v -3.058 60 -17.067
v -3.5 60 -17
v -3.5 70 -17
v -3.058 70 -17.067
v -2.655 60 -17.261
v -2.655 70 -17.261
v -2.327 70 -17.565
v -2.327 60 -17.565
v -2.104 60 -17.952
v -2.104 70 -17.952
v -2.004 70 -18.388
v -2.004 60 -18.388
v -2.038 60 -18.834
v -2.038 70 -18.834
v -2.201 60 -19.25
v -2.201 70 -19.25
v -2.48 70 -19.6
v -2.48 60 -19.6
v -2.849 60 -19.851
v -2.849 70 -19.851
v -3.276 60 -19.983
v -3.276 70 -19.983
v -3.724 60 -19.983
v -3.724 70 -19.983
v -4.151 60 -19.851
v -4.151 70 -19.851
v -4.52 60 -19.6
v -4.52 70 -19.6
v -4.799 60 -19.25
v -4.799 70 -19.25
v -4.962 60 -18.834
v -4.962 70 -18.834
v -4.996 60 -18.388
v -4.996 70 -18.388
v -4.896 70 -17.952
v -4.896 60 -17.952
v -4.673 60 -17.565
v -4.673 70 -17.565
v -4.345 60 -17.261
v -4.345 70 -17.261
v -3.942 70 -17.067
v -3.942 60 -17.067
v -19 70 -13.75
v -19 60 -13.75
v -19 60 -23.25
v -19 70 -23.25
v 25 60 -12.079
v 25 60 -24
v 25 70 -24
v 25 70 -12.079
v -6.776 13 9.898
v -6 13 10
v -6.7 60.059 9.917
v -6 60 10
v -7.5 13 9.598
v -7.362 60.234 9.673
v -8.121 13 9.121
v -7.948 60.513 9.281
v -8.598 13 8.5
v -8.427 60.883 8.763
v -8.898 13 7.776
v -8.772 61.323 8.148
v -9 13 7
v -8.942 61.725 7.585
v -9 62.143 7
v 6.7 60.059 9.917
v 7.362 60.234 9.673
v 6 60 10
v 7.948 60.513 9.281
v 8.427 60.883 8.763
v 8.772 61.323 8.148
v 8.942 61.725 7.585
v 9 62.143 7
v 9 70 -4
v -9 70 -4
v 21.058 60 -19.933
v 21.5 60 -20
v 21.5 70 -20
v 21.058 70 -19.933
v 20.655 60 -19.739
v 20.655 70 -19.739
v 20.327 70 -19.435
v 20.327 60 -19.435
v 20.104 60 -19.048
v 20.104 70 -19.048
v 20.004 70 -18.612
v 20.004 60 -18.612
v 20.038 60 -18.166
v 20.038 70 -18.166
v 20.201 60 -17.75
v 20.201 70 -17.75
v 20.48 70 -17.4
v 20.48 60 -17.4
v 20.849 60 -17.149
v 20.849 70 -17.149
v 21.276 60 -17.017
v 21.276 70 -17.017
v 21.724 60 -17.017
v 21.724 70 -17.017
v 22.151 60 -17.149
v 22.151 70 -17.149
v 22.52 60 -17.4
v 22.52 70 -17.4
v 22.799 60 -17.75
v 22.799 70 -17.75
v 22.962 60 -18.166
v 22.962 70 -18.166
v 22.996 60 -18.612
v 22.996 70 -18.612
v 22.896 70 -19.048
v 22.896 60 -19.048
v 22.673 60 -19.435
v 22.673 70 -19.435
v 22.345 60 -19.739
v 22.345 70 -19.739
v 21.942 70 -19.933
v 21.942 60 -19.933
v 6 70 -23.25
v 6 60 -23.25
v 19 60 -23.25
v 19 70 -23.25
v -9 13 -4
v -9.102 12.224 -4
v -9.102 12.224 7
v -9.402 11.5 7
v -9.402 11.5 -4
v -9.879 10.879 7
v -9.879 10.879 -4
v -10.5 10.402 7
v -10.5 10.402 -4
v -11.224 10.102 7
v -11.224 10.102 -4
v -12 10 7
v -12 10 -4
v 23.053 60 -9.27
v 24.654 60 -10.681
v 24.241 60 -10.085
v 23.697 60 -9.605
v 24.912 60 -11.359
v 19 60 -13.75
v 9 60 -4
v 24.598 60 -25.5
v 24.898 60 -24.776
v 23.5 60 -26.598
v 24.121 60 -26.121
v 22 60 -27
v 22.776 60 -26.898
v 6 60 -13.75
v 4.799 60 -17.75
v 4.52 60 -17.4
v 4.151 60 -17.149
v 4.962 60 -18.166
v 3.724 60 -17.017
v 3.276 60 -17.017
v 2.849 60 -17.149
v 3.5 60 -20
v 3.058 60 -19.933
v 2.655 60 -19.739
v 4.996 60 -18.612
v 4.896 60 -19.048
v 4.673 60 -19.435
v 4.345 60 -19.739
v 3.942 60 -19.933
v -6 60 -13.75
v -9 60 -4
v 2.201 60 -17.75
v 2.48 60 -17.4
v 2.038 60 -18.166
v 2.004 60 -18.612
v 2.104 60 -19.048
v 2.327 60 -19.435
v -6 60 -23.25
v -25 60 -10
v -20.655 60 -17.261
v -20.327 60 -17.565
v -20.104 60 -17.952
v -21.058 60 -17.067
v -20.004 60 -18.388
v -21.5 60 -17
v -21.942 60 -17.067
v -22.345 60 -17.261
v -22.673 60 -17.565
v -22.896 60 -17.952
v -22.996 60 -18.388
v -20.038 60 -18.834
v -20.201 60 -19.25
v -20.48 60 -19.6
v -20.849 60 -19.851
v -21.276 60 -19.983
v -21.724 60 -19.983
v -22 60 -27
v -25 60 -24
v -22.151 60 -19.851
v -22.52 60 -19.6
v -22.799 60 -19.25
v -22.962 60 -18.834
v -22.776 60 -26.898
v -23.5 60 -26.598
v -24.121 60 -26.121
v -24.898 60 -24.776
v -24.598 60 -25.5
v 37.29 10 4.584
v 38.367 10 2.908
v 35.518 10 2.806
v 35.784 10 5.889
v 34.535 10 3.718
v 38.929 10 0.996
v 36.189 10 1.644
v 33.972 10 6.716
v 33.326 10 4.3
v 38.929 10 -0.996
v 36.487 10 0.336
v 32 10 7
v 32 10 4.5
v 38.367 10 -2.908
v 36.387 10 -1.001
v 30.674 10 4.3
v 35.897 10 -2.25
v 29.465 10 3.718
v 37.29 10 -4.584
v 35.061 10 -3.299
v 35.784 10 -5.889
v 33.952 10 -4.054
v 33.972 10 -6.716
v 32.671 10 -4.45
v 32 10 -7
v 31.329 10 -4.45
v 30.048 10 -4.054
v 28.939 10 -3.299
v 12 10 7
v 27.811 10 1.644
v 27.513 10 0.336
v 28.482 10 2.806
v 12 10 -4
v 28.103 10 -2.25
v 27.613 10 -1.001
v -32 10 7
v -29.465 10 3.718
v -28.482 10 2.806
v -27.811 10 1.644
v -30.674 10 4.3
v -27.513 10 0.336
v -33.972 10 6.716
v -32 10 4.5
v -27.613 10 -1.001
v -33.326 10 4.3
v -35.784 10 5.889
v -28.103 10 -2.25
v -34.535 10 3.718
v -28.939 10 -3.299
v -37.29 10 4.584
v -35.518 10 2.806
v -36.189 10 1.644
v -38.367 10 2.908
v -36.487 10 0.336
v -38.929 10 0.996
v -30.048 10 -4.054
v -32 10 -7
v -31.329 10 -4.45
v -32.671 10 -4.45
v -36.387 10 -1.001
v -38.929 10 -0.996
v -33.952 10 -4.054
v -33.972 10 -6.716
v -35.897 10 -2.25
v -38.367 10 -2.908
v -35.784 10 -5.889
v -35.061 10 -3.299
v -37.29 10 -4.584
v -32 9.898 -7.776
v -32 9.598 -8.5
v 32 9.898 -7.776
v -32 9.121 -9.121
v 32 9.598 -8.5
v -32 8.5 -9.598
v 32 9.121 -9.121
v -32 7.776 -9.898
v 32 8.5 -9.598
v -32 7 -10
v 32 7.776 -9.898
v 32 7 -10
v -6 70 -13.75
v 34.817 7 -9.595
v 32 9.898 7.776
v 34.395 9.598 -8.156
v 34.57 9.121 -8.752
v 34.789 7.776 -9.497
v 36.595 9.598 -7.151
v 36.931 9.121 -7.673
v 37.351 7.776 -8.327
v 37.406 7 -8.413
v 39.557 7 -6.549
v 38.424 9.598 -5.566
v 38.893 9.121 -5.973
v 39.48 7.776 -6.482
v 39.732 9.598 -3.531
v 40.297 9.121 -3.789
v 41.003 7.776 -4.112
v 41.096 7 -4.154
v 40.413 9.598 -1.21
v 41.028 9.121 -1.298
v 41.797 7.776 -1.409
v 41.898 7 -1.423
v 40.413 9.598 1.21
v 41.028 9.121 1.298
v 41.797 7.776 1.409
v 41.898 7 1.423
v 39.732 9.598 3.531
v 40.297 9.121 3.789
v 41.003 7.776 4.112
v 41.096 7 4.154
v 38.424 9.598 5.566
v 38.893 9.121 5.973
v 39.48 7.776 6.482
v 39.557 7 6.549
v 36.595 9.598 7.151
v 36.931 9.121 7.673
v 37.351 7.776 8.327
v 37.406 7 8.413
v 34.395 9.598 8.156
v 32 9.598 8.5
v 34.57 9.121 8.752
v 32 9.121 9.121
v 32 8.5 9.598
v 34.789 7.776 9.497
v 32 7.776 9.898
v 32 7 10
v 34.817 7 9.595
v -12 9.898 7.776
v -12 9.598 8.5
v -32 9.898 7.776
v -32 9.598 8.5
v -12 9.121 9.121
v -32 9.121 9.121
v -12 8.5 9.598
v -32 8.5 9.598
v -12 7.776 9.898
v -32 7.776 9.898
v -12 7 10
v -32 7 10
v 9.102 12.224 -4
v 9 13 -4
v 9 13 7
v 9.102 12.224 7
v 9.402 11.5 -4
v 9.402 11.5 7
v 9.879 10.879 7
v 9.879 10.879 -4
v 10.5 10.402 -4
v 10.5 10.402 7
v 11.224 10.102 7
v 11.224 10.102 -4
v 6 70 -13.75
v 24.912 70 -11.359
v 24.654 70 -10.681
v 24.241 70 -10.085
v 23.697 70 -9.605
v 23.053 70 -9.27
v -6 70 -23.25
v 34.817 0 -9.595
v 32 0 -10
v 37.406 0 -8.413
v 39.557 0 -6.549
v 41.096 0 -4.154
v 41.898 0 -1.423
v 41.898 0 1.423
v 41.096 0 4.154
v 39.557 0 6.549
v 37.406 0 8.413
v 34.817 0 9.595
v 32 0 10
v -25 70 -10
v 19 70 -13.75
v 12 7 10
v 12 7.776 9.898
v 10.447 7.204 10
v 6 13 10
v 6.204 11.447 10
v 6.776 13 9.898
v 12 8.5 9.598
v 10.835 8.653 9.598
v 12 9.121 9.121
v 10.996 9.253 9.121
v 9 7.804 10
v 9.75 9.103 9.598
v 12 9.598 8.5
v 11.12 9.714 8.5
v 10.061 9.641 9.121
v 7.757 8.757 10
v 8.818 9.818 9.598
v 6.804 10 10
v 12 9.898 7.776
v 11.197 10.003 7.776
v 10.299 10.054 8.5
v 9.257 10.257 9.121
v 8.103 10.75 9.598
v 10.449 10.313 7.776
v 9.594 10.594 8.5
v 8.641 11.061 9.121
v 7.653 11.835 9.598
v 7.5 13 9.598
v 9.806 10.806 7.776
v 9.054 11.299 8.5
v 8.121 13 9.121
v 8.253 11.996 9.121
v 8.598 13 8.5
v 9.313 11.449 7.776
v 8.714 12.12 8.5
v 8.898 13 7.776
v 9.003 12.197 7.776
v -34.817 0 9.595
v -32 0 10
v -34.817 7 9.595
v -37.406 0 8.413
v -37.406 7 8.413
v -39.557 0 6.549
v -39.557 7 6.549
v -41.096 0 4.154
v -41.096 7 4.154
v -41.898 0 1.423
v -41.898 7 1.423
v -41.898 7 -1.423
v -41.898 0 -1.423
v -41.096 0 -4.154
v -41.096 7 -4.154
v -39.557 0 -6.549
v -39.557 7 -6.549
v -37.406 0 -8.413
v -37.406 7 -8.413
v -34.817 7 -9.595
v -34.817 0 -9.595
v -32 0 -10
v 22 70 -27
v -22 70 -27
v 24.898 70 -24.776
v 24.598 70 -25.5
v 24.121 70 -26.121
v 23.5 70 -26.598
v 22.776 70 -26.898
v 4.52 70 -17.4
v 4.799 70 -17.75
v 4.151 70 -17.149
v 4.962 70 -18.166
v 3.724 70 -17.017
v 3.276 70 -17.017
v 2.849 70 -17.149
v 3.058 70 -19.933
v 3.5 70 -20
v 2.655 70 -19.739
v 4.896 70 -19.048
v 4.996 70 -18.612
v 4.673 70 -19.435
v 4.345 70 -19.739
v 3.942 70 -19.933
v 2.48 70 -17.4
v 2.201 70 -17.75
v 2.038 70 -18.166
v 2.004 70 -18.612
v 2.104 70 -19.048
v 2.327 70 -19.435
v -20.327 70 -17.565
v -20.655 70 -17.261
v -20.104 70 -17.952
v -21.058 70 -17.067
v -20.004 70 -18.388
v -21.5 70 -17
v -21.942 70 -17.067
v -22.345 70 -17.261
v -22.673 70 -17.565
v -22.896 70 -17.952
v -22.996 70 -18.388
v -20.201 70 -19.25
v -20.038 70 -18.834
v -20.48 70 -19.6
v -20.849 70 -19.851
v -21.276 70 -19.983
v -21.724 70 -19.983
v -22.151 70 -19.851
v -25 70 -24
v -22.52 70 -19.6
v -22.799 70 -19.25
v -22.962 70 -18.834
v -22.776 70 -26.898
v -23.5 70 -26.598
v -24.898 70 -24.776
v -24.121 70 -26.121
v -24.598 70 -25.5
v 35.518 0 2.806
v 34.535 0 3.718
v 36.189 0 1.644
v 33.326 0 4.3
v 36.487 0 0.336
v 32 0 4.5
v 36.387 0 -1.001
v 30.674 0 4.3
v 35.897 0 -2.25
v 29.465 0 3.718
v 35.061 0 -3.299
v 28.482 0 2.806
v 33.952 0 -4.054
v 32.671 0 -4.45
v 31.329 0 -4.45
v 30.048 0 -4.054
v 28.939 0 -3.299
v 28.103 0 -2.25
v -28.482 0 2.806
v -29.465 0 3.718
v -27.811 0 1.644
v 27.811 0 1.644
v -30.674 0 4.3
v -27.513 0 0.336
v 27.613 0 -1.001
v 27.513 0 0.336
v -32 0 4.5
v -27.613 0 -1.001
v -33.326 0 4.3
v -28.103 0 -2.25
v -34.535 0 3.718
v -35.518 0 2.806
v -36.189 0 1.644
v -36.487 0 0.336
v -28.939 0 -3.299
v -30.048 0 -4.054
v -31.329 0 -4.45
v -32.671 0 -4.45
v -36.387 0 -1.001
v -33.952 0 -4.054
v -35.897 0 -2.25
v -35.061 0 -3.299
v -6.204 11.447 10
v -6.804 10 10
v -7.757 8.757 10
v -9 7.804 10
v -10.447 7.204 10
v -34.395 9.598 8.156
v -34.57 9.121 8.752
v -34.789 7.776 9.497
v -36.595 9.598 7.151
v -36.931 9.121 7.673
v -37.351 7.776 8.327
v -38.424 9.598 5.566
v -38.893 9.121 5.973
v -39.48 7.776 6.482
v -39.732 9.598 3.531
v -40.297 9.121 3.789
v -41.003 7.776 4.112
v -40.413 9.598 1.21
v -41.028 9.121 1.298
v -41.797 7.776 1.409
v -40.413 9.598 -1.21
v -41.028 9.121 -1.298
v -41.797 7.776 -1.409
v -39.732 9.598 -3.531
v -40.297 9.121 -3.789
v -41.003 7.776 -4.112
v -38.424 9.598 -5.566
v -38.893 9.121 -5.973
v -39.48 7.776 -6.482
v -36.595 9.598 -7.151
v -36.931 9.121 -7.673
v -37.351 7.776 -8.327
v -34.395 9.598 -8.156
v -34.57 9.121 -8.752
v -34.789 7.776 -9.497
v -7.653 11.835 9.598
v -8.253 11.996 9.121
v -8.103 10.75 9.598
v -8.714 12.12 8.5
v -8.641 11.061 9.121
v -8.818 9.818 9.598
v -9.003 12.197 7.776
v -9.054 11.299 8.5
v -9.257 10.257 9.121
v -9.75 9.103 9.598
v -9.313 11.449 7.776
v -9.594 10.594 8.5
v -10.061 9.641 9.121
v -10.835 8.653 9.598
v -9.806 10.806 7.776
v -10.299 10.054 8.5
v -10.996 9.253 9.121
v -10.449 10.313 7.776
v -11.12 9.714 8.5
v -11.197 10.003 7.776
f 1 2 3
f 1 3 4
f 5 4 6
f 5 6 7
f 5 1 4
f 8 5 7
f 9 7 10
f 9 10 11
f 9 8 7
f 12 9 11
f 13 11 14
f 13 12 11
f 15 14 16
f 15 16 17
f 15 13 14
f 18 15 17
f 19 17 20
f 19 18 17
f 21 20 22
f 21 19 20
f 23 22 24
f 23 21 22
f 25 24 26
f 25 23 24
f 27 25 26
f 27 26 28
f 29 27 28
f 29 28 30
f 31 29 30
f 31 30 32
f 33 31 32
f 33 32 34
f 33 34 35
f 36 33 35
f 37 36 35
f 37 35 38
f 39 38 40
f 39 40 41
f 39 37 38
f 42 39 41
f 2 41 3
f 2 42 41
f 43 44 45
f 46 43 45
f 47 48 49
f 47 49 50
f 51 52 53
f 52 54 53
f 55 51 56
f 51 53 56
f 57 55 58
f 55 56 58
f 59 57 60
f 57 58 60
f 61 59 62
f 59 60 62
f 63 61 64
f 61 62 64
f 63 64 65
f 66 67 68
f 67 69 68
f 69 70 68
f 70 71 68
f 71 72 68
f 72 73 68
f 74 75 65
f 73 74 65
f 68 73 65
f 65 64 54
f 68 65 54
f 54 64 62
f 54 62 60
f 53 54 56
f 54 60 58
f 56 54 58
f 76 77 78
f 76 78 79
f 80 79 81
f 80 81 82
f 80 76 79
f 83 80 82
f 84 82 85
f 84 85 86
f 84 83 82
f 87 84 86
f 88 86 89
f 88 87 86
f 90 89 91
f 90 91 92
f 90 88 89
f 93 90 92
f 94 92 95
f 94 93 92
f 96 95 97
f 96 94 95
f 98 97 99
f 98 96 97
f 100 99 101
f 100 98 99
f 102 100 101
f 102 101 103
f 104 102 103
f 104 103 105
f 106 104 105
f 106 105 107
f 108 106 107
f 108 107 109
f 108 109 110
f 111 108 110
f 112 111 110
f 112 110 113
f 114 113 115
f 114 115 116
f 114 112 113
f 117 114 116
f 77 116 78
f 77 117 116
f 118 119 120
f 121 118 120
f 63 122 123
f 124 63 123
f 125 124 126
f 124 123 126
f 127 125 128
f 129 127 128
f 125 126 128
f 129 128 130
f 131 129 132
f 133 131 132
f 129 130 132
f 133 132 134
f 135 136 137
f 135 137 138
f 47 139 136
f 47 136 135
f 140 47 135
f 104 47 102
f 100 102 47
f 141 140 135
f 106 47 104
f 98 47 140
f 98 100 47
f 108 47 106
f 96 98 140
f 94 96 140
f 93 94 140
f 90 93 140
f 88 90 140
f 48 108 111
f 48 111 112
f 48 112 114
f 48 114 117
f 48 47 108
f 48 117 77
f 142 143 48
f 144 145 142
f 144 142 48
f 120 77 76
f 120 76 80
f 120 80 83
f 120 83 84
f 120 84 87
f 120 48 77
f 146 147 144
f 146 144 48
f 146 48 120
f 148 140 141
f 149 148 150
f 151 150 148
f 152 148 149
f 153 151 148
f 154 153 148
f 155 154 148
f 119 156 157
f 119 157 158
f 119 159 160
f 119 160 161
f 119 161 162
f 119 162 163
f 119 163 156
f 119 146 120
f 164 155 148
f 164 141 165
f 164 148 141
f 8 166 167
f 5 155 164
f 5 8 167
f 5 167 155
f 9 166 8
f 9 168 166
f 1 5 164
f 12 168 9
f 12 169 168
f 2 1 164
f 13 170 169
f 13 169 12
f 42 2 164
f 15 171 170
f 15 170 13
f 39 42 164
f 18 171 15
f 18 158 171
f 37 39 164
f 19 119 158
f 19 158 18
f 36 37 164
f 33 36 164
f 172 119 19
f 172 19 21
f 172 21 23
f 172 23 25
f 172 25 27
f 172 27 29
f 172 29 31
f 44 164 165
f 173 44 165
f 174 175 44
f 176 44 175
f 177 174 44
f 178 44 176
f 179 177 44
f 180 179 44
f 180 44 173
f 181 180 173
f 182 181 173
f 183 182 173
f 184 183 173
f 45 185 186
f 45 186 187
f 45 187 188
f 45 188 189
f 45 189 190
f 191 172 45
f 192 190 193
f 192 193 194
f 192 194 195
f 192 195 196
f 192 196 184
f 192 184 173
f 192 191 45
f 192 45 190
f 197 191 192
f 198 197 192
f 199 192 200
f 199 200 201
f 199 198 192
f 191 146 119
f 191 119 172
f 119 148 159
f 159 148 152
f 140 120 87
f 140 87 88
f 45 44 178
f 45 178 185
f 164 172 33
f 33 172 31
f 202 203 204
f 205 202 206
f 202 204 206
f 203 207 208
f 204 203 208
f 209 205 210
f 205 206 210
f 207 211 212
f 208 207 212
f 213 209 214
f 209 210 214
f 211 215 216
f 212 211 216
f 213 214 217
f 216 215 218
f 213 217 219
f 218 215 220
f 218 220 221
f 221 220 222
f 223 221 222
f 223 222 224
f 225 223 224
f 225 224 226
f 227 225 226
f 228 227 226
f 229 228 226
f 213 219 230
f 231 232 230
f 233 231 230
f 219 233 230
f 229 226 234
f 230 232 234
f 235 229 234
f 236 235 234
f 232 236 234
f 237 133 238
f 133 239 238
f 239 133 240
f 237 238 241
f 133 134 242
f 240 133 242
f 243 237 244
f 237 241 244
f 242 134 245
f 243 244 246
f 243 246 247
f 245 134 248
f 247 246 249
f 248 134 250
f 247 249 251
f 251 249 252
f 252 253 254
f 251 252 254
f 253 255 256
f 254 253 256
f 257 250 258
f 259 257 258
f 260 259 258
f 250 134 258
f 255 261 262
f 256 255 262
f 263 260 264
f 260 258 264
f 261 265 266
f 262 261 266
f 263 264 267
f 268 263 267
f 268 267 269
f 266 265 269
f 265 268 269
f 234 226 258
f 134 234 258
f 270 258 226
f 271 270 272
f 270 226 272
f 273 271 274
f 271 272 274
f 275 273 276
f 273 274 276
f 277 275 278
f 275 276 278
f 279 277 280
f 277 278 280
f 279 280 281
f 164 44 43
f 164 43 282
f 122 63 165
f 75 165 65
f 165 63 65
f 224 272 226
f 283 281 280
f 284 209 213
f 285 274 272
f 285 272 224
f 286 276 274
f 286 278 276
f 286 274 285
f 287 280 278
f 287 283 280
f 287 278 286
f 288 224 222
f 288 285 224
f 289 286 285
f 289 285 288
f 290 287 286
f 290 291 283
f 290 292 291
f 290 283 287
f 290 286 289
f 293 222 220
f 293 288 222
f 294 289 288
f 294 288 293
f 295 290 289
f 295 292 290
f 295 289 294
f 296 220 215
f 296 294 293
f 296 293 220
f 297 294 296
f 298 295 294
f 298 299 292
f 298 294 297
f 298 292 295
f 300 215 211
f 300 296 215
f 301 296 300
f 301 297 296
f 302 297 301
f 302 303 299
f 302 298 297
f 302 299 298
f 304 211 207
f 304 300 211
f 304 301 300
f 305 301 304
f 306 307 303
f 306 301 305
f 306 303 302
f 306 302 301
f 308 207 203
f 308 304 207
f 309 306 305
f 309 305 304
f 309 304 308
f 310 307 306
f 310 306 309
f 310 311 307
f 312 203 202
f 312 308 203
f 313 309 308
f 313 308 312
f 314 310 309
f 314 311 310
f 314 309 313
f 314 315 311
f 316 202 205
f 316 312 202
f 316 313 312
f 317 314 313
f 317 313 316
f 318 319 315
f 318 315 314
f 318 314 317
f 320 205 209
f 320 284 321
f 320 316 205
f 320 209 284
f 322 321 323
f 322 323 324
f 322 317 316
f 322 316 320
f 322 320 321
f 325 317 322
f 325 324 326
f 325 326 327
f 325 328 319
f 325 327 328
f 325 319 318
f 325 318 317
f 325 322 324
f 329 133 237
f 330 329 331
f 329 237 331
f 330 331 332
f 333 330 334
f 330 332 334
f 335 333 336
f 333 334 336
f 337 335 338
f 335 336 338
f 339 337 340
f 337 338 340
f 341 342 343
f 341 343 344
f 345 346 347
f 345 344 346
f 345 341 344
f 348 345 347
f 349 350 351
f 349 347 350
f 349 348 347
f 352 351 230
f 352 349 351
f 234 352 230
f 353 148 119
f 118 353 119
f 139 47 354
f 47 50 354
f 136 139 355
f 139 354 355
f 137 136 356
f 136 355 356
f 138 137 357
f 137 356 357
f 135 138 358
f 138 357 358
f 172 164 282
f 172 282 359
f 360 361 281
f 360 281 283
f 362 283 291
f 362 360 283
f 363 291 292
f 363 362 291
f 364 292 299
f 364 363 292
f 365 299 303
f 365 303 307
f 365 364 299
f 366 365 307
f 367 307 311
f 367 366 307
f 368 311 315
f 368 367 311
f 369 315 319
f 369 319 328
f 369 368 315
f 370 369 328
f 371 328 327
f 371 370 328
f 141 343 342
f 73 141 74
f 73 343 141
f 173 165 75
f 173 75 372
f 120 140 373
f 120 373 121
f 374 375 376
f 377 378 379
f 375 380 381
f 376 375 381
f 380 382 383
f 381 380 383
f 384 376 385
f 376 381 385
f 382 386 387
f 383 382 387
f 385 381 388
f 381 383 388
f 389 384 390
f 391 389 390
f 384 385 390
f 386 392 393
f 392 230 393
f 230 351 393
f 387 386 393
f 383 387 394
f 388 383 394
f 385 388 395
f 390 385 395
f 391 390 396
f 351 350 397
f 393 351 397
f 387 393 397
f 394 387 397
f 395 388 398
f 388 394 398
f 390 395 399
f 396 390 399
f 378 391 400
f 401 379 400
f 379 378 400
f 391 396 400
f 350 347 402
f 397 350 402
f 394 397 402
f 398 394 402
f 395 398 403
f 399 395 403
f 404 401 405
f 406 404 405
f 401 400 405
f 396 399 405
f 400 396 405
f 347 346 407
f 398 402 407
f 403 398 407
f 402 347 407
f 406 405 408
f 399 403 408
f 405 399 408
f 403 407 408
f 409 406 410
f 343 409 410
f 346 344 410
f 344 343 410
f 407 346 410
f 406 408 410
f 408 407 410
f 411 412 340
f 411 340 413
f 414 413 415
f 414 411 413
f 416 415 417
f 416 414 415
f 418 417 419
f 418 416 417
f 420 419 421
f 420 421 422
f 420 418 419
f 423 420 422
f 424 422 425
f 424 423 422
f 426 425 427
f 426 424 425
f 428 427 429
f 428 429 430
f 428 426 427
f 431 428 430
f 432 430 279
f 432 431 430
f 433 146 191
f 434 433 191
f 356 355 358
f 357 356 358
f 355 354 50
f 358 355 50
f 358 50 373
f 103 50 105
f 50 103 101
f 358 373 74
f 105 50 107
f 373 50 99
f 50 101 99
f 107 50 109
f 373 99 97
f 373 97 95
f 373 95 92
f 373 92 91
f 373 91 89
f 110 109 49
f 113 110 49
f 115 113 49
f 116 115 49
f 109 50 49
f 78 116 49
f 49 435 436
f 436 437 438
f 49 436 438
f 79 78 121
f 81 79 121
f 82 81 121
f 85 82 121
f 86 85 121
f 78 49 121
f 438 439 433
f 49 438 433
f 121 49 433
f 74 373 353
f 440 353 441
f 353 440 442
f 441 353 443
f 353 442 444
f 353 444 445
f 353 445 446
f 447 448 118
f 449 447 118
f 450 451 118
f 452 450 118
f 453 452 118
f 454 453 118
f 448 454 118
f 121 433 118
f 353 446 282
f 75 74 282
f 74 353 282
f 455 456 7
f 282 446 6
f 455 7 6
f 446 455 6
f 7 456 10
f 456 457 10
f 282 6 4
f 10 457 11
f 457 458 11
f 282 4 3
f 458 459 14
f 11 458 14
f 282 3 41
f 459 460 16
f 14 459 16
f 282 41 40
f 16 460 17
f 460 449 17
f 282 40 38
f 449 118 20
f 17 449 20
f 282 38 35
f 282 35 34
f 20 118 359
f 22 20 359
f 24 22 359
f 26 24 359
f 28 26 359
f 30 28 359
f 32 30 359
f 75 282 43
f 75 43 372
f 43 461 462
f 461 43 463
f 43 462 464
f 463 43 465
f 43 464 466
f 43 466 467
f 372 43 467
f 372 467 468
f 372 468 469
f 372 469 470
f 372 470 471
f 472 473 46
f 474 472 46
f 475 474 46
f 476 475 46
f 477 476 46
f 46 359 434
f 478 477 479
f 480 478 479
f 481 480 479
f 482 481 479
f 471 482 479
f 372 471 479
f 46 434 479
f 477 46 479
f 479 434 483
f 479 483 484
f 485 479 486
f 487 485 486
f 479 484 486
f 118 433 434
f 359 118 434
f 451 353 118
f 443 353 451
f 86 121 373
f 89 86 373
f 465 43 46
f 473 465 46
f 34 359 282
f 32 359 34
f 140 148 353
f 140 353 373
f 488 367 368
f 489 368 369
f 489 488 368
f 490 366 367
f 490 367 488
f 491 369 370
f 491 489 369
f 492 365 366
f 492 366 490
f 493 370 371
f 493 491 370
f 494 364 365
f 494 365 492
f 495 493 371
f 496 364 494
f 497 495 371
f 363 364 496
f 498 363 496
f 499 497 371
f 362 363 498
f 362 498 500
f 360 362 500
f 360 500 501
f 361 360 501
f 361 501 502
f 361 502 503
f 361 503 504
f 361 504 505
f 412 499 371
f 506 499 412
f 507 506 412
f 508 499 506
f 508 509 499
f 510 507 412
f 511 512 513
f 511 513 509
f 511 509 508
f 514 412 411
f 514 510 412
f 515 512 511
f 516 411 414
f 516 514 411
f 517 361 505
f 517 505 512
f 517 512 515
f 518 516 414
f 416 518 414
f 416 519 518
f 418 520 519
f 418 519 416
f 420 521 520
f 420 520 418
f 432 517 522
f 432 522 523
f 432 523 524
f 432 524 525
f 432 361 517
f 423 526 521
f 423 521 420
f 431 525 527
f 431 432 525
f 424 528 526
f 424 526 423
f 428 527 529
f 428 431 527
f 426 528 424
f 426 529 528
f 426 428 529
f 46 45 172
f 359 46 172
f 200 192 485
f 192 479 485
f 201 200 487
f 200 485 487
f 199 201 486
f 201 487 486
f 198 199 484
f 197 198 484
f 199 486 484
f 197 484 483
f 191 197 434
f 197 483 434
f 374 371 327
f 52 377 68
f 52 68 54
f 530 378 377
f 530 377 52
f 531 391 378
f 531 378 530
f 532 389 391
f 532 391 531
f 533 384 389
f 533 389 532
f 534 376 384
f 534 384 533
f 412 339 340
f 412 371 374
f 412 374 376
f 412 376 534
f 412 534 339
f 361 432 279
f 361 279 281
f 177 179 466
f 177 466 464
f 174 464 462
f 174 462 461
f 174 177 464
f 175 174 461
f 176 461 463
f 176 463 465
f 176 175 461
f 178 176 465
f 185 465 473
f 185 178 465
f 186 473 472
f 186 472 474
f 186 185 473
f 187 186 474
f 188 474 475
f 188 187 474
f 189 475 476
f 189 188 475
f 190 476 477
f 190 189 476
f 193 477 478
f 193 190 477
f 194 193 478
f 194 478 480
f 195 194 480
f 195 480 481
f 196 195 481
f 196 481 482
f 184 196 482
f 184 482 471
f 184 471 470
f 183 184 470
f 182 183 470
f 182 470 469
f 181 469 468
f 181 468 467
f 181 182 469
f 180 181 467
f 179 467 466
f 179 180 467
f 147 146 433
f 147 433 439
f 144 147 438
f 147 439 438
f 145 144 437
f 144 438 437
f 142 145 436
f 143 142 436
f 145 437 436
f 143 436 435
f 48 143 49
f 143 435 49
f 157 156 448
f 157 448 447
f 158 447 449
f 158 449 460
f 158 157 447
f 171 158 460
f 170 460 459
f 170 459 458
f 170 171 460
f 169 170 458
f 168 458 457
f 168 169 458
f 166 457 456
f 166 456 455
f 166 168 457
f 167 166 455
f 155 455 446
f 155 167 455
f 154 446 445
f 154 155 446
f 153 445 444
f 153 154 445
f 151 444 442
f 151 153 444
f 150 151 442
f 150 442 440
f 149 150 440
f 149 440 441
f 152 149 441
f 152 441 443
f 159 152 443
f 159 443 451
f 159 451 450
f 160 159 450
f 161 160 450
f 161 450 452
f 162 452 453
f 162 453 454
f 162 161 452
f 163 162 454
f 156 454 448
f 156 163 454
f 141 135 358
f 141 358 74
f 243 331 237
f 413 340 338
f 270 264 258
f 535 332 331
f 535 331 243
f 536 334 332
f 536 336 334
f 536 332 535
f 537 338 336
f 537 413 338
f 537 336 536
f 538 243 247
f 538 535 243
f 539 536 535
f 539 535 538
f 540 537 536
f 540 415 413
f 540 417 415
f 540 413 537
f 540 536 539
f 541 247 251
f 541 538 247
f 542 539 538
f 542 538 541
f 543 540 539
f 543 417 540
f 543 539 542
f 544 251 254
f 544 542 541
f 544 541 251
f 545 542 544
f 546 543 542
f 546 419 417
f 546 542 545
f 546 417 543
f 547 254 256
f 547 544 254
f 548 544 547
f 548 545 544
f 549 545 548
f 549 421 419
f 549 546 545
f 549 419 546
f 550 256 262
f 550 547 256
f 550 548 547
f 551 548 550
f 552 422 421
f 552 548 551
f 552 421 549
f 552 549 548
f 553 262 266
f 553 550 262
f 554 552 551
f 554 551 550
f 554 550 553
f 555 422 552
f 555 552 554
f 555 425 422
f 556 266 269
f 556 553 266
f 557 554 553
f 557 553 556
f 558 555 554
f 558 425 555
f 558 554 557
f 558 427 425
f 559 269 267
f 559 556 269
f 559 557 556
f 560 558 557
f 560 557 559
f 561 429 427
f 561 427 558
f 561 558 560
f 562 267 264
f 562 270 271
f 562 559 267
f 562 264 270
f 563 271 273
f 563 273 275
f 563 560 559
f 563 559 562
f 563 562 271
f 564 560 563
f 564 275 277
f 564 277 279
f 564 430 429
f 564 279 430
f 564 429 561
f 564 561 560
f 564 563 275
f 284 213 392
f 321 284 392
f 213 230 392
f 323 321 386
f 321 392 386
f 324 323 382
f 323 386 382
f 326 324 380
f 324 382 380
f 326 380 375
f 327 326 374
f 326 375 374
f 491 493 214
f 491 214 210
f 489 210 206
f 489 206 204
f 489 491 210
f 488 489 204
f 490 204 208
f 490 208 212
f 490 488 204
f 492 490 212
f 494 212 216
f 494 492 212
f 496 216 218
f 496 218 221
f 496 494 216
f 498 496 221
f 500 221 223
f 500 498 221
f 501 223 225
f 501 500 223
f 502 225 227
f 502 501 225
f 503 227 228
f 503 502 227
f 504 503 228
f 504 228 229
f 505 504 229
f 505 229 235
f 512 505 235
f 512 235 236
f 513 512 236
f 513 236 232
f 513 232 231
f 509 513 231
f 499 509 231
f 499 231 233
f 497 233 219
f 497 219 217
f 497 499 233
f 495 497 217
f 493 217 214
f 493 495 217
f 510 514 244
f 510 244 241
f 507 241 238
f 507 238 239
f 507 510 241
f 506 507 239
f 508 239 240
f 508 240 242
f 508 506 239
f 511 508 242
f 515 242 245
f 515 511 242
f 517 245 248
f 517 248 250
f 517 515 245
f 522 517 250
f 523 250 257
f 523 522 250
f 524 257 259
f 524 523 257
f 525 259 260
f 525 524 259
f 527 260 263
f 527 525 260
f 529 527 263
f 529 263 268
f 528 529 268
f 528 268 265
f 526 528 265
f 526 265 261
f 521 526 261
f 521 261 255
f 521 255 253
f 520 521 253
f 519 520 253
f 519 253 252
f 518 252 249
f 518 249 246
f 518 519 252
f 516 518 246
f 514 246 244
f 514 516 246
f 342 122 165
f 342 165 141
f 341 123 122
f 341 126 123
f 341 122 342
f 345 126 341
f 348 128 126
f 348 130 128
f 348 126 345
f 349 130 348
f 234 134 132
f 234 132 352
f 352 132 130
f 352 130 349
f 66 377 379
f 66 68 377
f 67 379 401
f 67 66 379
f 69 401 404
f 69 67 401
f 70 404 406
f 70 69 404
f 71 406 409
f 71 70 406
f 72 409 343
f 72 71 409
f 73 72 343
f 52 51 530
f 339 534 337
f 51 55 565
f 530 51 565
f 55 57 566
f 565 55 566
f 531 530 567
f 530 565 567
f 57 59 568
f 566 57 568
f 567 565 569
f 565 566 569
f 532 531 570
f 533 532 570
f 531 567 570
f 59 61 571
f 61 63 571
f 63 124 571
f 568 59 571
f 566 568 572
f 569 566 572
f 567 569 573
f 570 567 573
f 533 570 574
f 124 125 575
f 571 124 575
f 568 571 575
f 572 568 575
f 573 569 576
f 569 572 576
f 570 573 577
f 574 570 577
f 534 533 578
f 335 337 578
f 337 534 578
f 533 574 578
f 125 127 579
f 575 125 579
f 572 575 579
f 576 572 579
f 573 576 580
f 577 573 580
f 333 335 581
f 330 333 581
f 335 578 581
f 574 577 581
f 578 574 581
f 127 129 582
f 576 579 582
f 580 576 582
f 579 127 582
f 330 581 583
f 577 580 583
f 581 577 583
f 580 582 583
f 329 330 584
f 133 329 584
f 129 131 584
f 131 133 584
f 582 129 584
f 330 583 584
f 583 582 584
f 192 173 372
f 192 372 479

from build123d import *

# Parameters (mm, degrees)
SKETCH1_R           = 4.5
BOSS_EXTRUDE1_DEPTH = 10
SKETCH2_W           = 18
SKETCH2_H           = 14
BOSS_EXTRUDE2_DEPTH = 50
SKETCH4_R           = 1.5
SKETCH4_W           = 13
SKETCH4_H           = 9.5
BOSS_EXTRUDE3_DEPTH = 10
LOFT2_START         = -9
LOFT2_DEPTH         = 18
FILLET4_R           = 3


# Read off the part's stored shape, not the designer's step: Loft2
with BuildPart() as part:
    # Sketch1 → Boss-Extrude1 (new body)
    with BuildSketch(Plane(origin=(0, 0, 0), x_dir=(1, 0, 0), z_dir=(0, 1, 0))):
        with BuildLine():
            Line((-32, 10), (32, 10))
            ThreePointArc((32, 10), (42, 0), (32, -10))
            Line((32, -10), (-32, -10))
            ThreePointArc((-32, -10), (-42, 0), (-32, 10))
        make_face()
        with Locations(Location((-32, 0, 0), (0, 0, 270))):
            Circle(SKETCH1_R, mode=Mode.SUBTRACT)
        with Locations(Location((32, 0, 0), (0, 0, 270))):
            Circle(SKETCH1_R, mode=Mode.SUBTRACT)
    extrude(amount=BOSS_EXTRUDE1_DEPTH)

    # Sketch2 → Boss-Extrude2 (add)
    with BuildSketch(Plane(origin=(0, 10, 0), x_dir=(1, 0, 0), z_dir=(0, 1, 0))):
        with Locations((0, -3)):
            Rectangle(SKETCH2_W, SKETCH2_H)
    extrude(amount=BOSS_EXTRUDE2_DEPTH)



with BuildPart() as body_2:
    # Sketch4 → Boss-Extrude3 (new body)
    with BuildSketch(Plane(origin=(0, 60, 0), x_dir=(1, 0, 0), z_dir=(0, 1, 0))):
        Polygon((-25, 10), (-25, 27), (0, 27), (25, 27), (25, 10), (9, 4), (-9, 4), align=None)
        with Locations(Location((-21.5, 18.5, 0), (0, 0, 270))):
            Circle(SKETCH4_R, mode=Mode.SUBTRACT)
        with Locations(Location((-3.5, 18.5, 0), (0, 0, 270))):
            Circle(SKETCH4_R, mode=Mode.SUBTRACT)
        with Locations(Location((3.5, 18.5, 0), (0, 0, 90))):
            Circle(SKETCH4_R, mode=Mode.SUBTRACT)
        with Locations(Location((21.5, 18.5, 0), (0, 0, 90))):
            Circle(SKETCH4_R, mode=Mode.SUBTRACT)
        with Locations((-12.5, 18.5)):
            Rectangle(SKETCH4_W, SKETCH4_H, mode=Mode.SUBTRACT)
        with Locations((12.5, 18.5)):
            Rectangle(SKETCH4_W, SKETCH4_H, mode=Mode.SUBTRACT)
    extrude(amount=BOSS_EXTRUDE3_DEPTH)


with BuildPart() as part_1:
    add(part.part)

    add(body_2.part)  # Loft2 merges body 2
    # Loft2 outline → Loft2 (add)
    with BuildSketch(Plane.YZ.offset(LOFT2_START)):
        Polygon((60, -4), (70, -4), (60, 10), align=None)
    extrude(amount=LOFT2_DEPTH)

    # Fillet4
    fillet4_edges = [part_1.edges().sort_by_distance(p)[0] for p in [
        (0, 10, -10),
        (-42, 10, 0),
        (42, 10, 0),
        (9, 35, 10),
        (9, 10, 3),
        (-9, 10, 3),
        (20.5, 10, 10),
        (-20.5, 10, 10),
        (25, 65, -10),
        (25, 65, -27),
        (-25, 65, -27),
        (-9, 35, 10),
    ]]
    fillet(fillet4_edges, radius=FILLET4_R)


solid = part_1.part
